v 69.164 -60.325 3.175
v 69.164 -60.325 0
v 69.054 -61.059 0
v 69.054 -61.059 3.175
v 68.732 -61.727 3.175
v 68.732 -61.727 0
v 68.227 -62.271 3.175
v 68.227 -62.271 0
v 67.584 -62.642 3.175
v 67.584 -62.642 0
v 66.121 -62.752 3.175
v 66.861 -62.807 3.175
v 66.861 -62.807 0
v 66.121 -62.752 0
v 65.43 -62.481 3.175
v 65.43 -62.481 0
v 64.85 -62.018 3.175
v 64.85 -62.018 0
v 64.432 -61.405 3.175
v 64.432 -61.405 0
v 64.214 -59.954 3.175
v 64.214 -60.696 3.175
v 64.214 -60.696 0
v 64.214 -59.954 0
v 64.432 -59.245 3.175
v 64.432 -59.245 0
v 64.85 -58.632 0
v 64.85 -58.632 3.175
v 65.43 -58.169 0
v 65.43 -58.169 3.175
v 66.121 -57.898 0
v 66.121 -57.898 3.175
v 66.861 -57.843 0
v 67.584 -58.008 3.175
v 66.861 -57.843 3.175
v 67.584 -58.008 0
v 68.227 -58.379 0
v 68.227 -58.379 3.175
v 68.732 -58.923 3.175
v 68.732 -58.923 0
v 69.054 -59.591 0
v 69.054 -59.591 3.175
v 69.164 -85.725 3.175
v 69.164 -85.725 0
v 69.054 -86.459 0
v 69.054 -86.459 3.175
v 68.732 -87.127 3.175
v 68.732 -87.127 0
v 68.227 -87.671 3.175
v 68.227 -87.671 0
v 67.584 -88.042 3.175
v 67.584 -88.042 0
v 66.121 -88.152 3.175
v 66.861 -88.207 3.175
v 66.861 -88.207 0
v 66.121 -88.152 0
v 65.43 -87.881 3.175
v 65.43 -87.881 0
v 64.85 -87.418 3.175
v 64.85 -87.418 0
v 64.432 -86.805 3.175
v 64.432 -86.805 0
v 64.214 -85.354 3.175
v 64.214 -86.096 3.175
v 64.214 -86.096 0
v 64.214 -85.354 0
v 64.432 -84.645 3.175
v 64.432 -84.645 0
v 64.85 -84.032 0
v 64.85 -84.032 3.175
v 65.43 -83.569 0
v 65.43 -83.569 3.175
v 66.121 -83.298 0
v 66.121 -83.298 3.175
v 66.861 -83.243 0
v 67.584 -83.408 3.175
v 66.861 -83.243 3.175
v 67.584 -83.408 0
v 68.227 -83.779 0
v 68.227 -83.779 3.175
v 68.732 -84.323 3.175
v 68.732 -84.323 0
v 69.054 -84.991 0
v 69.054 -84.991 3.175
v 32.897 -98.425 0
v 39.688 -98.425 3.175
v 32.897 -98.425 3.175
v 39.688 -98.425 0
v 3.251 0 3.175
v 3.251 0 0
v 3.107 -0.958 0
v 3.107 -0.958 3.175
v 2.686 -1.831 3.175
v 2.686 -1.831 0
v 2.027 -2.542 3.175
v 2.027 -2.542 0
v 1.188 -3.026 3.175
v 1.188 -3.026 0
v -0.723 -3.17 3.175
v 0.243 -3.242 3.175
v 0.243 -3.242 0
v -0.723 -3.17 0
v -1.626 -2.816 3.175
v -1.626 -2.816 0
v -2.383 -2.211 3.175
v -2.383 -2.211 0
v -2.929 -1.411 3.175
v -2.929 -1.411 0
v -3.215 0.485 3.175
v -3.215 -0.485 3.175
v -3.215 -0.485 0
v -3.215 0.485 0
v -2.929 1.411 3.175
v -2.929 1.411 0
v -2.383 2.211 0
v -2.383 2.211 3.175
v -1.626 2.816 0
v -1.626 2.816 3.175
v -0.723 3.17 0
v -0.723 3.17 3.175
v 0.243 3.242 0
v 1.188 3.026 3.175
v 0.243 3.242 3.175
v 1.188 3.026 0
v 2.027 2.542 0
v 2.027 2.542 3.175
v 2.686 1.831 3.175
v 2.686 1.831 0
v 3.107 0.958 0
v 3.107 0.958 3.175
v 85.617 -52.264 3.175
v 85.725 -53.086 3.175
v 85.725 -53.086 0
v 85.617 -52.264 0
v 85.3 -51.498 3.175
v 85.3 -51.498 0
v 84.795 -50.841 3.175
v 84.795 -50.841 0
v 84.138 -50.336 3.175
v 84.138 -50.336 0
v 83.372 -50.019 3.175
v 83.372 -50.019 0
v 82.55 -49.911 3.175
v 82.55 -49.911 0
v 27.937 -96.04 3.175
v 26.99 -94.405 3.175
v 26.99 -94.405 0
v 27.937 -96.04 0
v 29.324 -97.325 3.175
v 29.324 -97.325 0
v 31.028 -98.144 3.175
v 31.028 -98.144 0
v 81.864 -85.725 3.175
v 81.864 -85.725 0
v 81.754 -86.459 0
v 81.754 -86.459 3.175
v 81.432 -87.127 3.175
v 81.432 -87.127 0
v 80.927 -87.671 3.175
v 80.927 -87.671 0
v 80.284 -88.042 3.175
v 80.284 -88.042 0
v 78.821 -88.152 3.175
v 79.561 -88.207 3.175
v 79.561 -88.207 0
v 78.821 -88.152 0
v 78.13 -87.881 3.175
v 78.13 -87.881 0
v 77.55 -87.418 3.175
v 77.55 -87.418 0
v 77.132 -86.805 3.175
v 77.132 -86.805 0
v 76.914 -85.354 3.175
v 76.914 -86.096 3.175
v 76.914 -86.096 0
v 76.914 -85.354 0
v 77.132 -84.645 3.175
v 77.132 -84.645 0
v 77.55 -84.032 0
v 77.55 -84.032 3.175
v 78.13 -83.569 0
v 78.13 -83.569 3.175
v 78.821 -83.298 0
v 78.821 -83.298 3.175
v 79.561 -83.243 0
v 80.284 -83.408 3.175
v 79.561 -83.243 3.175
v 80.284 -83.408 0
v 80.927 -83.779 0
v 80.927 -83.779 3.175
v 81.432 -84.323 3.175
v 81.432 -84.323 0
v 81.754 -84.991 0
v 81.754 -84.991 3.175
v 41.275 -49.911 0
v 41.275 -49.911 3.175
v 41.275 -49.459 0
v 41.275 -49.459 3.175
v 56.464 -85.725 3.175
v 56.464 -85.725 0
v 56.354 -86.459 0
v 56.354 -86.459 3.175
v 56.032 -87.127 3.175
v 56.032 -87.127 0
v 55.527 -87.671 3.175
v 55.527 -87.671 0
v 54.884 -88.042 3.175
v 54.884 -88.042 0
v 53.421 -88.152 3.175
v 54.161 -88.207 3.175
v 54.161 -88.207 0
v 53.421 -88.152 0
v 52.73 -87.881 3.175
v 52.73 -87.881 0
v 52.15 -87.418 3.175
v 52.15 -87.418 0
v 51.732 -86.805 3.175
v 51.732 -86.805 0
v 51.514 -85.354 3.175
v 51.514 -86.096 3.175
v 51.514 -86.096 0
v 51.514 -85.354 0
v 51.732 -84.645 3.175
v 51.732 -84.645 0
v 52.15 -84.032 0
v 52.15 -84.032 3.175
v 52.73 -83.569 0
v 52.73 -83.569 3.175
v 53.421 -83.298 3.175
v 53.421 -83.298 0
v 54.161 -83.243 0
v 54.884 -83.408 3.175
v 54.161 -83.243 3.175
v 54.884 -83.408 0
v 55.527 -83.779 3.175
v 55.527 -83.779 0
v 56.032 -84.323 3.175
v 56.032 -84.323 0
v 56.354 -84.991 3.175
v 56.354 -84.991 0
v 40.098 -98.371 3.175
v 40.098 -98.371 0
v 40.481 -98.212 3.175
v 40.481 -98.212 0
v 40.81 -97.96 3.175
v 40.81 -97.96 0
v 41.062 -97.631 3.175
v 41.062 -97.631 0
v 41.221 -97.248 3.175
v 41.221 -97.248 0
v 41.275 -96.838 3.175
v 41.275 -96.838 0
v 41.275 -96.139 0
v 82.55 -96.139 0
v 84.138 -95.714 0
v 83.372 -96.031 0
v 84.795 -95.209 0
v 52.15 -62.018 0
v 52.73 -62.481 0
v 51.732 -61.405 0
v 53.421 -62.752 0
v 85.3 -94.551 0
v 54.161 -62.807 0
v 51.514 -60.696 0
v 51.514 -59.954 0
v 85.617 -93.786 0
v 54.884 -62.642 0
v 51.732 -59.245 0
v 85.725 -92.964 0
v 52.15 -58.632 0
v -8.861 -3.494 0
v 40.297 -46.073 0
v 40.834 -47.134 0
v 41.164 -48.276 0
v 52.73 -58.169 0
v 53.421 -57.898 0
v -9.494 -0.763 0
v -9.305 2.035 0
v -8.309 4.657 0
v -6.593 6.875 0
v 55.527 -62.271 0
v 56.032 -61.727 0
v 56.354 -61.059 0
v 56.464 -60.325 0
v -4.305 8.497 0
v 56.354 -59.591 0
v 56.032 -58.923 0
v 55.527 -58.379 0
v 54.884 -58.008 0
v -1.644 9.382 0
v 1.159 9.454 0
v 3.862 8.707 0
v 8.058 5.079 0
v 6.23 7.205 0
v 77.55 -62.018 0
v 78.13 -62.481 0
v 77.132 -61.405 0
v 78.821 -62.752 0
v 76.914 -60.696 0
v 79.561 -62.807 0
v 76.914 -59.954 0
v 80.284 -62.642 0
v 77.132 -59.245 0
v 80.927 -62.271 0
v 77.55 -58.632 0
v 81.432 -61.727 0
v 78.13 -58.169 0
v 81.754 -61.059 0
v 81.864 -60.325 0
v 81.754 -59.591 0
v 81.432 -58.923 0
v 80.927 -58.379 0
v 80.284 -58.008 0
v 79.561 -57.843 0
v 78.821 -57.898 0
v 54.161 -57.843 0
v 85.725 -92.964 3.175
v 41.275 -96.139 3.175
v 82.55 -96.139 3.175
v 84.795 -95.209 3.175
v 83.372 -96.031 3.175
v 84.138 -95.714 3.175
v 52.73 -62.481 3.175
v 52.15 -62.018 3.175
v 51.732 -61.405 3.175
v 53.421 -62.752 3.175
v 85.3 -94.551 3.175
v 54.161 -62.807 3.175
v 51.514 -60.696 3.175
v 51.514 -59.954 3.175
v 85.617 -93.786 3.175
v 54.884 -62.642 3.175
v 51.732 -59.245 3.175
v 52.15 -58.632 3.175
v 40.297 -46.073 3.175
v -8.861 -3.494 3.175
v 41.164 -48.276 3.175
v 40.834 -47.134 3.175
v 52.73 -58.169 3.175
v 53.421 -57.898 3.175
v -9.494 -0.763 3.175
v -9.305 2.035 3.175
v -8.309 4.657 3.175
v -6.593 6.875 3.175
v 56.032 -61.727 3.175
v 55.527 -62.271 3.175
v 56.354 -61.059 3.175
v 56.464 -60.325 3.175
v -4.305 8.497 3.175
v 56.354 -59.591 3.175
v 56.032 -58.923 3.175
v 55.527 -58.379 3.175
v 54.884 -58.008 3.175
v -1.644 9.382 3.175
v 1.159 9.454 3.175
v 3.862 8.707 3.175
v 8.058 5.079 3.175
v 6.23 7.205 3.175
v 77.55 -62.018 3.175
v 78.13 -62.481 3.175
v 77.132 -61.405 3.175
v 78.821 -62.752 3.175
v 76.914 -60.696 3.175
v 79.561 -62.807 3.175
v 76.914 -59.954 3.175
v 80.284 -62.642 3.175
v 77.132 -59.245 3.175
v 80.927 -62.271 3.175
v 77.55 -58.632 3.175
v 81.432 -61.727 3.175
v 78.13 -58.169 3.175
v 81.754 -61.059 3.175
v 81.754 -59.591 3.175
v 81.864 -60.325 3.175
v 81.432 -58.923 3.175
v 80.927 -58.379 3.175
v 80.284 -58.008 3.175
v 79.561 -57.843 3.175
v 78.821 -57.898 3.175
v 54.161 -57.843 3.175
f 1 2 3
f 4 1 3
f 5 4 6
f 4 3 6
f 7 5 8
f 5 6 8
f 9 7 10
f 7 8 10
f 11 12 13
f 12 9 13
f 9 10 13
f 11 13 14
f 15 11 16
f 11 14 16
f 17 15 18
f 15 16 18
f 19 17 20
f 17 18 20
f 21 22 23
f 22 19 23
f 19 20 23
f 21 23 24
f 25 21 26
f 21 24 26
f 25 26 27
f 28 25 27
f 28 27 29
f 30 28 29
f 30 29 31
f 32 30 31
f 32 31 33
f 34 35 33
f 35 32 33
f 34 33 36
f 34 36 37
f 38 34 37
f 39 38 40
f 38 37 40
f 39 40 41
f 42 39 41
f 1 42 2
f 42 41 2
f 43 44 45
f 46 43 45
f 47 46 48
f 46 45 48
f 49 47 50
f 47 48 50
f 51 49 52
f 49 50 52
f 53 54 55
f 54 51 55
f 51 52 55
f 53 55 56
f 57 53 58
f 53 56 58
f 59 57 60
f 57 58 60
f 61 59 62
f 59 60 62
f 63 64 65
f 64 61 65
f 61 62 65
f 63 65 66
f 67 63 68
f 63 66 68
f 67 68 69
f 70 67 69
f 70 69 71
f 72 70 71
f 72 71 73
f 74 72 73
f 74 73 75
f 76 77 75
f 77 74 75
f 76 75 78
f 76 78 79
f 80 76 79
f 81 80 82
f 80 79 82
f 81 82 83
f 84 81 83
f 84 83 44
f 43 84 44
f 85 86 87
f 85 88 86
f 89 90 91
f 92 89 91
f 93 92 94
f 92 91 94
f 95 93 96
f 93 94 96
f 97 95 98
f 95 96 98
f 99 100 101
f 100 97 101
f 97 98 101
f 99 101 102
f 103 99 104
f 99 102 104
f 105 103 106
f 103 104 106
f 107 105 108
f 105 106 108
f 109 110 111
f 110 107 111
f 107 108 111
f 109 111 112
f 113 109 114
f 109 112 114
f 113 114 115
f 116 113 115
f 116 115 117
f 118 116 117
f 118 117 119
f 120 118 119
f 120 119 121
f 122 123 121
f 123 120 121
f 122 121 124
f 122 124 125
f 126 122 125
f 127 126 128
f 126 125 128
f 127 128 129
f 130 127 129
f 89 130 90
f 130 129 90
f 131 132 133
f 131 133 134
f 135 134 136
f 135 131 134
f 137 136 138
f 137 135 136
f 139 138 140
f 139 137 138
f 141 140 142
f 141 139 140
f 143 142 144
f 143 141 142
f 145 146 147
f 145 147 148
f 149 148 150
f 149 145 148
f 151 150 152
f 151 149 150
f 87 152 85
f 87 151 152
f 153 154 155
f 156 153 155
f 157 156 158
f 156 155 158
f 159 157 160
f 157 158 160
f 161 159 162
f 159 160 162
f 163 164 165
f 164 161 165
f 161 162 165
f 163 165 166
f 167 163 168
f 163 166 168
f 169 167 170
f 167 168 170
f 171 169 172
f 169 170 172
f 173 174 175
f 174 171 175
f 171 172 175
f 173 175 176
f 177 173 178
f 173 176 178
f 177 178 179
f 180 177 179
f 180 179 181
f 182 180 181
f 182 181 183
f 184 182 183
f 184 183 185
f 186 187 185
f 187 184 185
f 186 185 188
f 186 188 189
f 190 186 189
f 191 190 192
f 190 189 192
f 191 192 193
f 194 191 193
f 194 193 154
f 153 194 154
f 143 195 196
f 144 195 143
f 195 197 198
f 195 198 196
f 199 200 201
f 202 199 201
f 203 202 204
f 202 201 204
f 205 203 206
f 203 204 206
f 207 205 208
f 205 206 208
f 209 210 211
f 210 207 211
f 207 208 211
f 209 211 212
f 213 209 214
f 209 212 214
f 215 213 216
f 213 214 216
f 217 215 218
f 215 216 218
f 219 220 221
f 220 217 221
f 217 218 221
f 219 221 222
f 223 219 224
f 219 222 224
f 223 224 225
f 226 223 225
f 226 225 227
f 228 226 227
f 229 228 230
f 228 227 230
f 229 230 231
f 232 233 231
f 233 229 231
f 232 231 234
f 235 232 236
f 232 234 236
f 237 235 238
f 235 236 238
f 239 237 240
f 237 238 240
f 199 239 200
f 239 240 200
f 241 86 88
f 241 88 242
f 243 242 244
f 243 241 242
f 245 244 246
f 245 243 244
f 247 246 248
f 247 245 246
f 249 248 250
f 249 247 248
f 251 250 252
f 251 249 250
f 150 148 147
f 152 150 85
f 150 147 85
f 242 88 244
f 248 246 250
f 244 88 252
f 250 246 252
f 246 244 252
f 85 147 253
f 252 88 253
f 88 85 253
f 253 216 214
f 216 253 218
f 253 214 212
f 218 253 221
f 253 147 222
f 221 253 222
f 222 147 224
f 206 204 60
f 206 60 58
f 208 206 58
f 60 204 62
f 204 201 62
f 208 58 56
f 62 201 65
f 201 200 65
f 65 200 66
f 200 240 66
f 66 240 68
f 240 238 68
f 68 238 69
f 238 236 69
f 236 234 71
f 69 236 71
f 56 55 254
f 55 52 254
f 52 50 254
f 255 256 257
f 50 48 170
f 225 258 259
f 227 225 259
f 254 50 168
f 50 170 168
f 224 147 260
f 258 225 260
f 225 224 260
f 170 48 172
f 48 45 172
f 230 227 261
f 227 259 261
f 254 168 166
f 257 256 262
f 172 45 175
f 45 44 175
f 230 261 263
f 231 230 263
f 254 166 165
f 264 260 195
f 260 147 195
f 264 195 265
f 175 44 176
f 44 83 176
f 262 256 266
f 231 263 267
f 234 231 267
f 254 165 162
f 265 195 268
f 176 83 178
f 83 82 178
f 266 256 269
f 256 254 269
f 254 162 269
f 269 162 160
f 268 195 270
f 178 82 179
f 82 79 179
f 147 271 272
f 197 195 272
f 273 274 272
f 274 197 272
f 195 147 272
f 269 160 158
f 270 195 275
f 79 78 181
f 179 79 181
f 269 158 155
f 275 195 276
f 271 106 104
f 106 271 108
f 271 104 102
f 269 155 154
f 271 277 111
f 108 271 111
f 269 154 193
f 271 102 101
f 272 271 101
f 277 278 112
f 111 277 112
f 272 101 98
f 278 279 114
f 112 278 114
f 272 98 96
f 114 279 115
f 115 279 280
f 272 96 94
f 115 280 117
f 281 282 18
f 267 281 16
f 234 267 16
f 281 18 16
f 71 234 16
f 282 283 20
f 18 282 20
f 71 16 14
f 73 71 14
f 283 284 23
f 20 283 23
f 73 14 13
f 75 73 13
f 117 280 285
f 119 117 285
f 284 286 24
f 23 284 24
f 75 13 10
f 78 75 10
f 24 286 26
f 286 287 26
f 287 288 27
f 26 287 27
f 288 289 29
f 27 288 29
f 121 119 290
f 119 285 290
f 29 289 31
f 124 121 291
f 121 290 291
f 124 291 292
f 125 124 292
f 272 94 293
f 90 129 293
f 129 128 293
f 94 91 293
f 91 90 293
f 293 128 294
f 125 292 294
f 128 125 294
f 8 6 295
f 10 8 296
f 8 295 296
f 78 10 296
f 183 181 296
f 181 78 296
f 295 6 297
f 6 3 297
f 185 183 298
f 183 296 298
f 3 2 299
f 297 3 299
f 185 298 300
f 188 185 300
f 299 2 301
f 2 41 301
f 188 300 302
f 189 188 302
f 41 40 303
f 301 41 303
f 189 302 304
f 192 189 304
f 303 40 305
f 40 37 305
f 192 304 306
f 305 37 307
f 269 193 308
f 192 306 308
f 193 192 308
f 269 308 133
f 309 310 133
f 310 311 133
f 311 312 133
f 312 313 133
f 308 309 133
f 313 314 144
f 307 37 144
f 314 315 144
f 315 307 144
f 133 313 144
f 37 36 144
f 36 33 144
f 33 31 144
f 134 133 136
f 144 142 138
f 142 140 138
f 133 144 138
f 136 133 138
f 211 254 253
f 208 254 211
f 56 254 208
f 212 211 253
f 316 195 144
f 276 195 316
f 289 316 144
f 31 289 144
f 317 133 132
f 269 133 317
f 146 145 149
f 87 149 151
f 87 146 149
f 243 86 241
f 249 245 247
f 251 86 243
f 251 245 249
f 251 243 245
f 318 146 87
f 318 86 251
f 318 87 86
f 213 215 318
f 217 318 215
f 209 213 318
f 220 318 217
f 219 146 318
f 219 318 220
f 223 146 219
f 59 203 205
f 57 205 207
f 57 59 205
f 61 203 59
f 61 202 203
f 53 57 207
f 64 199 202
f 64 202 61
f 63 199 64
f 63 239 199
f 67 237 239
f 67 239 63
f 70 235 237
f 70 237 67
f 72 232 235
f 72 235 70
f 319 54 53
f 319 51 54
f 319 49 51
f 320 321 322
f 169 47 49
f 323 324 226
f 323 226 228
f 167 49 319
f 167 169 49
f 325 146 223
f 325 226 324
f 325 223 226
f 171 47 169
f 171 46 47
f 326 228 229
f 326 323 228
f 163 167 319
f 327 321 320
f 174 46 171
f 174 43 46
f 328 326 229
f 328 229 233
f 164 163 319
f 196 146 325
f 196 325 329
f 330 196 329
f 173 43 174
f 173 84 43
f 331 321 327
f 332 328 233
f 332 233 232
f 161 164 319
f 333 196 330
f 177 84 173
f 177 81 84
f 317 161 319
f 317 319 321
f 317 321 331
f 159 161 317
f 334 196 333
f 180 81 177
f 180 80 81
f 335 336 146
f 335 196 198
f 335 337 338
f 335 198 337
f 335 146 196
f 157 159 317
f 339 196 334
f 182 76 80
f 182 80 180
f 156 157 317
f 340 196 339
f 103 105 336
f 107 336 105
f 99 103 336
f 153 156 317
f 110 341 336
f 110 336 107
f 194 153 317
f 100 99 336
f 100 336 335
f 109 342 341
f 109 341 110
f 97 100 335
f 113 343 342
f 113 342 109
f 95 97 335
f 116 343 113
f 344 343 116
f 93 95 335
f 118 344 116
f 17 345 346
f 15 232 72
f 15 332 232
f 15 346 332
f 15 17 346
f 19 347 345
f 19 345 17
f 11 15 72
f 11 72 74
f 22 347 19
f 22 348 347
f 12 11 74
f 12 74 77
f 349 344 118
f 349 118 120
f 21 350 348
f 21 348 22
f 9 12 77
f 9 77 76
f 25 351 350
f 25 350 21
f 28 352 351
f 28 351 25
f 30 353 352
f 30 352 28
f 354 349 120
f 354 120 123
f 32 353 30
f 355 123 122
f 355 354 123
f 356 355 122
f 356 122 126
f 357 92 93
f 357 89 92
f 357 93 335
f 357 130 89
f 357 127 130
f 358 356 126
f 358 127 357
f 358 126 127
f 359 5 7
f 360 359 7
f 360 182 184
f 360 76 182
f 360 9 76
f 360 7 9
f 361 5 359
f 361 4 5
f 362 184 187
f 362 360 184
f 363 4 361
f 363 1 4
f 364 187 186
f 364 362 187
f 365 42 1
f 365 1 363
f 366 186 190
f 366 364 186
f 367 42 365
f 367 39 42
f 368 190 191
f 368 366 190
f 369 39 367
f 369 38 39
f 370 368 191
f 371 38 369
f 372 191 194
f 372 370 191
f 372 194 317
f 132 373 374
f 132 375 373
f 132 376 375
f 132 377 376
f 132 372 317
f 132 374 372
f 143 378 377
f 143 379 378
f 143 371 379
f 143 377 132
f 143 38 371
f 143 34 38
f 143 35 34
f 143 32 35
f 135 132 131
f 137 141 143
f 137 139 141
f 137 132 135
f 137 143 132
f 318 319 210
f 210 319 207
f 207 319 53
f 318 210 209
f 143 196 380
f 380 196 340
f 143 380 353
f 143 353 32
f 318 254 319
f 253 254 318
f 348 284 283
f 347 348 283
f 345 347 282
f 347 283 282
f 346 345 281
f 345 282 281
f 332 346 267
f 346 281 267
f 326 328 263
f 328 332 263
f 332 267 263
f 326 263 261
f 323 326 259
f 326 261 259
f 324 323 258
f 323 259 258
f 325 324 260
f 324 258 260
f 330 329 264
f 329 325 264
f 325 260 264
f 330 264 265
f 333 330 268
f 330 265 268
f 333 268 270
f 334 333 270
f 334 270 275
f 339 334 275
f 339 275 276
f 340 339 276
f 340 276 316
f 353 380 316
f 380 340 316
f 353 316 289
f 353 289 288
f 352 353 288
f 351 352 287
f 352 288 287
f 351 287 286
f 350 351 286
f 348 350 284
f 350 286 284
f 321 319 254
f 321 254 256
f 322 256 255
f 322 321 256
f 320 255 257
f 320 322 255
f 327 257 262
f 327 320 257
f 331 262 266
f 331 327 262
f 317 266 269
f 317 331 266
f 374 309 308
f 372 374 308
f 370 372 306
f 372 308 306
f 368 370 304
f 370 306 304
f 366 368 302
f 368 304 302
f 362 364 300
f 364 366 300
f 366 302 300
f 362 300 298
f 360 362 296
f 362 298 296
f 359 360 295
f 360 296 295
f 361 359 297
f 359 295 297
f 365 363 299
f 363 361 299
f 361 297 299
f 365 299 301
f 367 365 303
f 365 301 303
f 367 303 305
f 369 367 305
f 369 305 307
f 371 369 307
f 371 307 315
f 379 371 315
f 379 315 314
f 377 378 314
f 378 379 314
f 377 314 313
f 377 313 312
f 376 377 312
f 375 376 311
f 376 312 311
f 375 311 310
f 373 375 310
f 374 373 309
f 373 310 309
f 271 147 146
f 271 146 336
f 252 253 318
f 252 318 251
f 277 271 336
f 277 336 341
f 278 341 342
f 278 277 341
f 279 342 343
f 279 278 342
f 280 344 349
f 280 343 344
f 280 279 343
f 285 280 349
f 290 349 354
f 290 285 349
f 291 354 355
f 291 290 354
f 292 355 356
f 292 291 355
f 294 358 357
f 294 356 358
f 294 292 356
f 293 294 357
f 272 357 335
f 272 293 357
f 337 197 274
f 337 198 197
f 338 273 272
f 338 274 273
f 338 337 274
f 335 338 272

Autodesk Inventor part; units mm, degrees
ref_plane "YZ Plane" through (0, 0, 0) normal (1, 0, 0) x (0, 1, 0)
ref_plane "XZ Plane" through (0, 0, 0) normal (0, 1, 0) x (-1, 0, 0)
ref_plane "XY Plane" through (0, 0, 0) normal (0, 0, 1) x (1, 0, 0)
sketch "Sketch1" plane through (0, 0, 0) normal (0, 0, 1) x (1, 0, 0)
  arc A0 (8.0581, 5.0787) -> (-8.8609, -3.4943) centre (0, 0) ccw
  line L0 (8.0581, 5.0787) -> (41.275, -47.625)
  line L1 (41.275, -47.625) -> (41.275, -49.911)
  line L2 (41.275, -49.911) -> (85.725, -49.911)
  line L3 (85.725, -49.911) -> (85.725, -96.139)
  line L4 (28.575, -98.425) -> (-8.8609, -3.4943)
  circle A1 centre (0, 0) radius 3.2512
  line L5 (85.725, -96.139) -> (41.275, -96.139)
  line L6 (41.275, -96.139) -> (41.275, -98.425)
  line L7 (41.275, -98.425) -> (28.575, -98.425)
  line L8 (85.725, -73.025) -> (85.7238, -73.025) construction
  circle A2 centre (79.375, -60.325) radius 2.4892
  circle A3 centre (66.675, -60.325) radius 2.4892
  circle A4 centre (79.375, -85.725) radius 2.4892
  circle A5 centre (66.675, -85.725) radius 2.4892
  circle A6 centre (53.975, -60.325) radius 2.4892
  circle A7 centre (53.975, -85.725) radius 2.4892
  line L9 (-9.525, 139.734) -> (-9.525, 40.2644) construction
  line L10 (-53.9331, -9.525) -> (112.0207, -9.525) construction
  dimension "d0" = 19.05
  dimension "d1" = 6.5024
  dimension "d2" = 2.286
  dimension "d3" = 4.9784
  dimension "d6" = 12.7
  dimension "d9" = 25.4
  dimension "d12" = 12.7
  dimension "d13" = 50.8
  dimension "d14" = 6.35
  dimension "d15" = 12.7
  dimension "d16" = 50.8
  dimension "d17" = 12.7
  dimension "d18" = 38.1
extrude "Extrusion1" add sketch "Sketch1" along normal blind 3.175
fillet "Fillet1" radius 3.175 2 edges at (85.725, -49.911, 1.5875) (85.725, -96.139, 1.5875)
fillet "Fillet1" radius 6.35 2 edges at (28.575, -98.425, 1.5875) (41.275, -47.625, 1.5875)
fillet "Fillet1" radius 1.5875 1 edges at (41.275, -98.425, 1.5875)
properties part number "VersaChassis Bumper Support Plate" material "Aluminum 6061"
